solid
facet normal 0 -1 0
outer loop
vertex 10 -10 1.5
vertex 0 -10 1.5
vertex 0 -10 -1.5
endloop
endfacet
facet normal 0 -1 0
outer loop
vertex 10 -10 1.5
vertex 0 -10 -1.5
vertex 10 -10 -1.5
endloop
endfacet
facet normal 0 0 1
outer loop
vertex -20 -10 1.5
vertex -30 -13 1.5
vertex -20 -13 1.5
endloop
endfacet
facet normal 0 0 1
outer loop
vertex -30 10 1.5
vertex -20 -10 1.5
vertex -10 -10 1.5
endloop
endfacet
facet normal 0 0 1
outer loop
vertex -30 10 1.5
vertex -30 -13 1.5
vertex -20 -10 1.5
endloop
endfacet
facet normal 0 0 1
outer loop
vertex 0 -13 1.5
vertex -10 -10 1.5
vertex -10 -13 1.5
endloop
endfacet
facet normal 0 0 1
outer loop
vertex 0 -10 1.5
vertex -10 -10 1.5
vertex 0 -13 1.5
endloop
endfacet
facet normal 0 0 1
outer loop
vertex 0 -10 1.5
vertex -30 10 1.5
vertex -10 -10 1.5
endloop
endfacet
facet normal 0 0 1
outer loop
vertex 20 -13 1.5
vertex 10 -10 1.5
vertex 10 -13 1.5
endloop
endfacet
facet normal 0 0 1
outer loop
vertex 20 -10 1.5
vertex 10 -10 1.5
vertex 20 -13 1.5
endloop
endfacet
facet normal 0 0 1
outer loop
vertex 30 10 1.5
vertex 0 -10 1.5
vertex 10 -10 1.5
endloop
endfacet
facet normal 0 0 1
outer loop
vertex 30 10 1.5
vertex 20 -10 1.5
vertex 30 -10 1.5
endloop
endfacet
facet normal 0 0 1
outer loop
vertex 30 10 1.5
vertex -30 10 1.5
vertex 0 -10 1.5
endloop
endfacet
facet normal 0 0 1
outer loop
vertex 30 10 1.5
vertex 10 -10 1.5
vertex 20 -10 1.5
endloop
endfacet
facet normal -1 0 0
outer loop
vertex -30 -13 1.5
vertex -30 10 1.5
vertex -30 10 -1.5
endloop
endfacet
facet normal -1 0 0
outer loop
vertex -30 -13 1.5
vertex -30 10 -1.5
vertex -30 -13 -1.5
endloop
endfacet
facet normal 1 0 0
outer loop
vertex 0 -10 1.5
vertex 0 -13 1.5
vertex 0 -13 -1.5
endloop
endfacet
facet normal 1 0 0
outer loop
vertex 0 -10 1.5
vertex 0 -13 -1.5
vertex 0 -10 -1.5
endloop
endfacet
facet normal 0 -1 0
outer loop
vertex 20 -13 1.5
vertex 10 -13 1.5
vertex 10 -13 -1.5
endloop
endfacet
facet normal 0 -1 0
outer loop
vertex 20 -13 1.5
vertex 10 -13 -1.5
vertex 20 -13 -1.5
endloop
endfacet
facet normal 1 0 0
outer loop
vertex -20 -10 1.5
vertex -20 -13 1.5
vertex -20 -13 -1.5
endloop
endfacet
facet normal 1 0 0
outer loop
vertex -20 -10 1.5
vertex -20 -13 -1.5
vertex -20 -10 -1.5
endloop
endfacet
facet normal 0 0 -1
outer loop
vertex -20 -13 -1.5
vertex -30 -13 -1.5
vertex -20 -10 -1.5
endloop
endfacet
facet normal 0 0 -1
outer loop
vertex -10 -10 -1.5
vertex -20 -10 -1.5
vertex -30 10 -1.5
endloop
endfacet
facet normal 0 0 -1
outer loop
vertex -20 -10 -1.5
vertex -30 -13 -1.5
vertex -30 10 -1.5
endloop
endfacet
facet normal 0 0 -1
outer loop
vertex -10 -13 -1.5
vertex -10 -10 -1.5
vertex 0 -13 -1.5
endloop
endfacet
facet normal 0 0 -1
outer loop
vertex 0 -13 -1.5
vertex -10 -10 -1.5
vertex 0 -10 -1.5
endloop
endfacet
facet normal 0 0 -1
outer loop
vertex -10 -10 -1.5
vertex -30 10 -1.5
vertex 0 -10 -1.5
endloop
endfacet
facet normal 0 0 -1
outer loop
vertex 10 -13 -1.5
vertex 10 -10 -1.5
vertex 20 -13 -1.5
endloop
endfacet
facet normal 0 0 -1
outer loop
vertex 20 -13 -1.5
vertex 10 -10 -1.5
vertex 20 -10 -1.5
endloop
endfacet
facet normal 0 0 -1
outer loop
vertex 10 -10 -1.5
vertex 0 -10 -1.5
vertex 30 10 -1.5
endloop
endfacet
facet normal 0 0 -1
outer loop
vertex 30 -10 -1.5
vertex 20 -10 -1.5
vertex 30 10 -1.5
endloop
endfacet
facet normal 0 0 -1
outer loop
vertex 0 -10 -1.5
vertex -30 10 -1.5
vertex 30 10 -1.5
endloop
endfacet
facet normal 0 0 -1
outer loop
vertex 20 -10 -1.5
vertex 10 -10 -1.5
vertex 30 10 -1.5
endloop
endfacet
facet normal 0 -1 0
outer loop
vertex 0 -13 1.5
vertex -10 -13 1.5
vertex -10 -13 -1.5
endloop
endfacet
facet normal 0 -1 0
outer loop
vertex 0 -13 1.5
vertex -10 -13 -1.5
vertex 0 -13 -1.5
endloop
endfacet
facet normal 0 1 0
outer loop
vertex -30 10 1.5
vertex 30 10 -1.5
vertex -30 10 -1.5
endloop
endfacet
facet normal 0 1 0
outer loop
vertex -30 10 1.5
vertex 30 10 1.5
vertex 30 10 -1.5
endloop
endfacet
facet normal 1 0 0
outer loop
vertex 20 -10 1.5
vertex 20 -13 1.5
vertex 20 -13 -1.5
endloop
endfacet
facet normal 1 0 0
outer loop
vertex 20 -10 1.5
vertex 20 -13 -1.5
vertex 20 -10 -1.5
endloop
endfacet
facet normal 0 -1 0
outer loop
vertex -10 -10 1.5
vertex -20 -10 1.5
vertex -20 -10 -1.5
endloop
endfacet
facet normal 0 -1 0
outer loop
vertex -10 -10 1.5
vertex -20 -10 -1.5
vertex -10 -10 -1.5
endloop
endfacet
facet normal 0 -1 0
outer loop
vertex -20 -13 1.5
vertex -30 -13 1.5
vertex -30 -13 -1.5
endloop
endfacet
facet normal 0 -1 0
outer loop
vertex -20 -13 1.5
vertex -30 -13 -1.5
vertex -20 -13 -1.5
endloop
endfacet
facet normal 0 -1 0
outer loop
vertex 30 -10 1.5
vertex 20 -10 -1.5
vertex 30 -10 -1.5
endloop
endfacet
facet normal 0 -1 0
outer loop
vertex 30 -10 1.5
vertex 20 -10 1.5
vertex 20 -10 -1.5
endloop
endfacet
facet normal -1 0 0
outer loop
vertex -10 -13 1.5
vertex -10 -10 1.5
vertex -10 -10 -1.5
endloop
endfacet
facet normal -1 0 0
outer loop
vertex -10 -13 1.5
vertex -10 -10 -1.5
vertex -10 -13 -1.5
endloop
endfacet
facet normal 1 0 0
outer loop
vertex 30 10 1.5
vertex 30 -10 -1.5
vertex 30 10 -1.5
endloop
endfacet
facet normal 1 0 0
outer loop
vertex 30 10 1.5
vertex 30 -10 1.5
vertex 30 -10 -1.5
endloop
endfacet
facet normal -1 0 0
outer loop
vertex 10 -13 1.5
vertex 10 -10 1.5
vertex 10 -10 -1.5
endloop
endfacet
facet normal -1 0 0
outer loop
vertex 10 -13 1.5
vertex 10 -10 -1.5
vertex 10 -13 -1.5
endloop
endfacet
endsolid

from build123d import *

# Parameters (mm, degrees)
F1_DEPTH = 1.5


with BuildPart() as f1:
    # F0 (on Top) → F1 (new body, symmetric)
    with BuildSketch(Plane.XY):
        Polygon((30, 10), (-30, 10), (-30, -10), (-30, -13), (-20, -13), (-20, -10), (-10, -10), (-10, -13), (0, -13), (0, -10), (10, -10), (10, -13), (20, -13), (20, -10), (30, -10), align=None)
    extrude(amount=F1_DEPTH, both=True)


solid = f1.part
